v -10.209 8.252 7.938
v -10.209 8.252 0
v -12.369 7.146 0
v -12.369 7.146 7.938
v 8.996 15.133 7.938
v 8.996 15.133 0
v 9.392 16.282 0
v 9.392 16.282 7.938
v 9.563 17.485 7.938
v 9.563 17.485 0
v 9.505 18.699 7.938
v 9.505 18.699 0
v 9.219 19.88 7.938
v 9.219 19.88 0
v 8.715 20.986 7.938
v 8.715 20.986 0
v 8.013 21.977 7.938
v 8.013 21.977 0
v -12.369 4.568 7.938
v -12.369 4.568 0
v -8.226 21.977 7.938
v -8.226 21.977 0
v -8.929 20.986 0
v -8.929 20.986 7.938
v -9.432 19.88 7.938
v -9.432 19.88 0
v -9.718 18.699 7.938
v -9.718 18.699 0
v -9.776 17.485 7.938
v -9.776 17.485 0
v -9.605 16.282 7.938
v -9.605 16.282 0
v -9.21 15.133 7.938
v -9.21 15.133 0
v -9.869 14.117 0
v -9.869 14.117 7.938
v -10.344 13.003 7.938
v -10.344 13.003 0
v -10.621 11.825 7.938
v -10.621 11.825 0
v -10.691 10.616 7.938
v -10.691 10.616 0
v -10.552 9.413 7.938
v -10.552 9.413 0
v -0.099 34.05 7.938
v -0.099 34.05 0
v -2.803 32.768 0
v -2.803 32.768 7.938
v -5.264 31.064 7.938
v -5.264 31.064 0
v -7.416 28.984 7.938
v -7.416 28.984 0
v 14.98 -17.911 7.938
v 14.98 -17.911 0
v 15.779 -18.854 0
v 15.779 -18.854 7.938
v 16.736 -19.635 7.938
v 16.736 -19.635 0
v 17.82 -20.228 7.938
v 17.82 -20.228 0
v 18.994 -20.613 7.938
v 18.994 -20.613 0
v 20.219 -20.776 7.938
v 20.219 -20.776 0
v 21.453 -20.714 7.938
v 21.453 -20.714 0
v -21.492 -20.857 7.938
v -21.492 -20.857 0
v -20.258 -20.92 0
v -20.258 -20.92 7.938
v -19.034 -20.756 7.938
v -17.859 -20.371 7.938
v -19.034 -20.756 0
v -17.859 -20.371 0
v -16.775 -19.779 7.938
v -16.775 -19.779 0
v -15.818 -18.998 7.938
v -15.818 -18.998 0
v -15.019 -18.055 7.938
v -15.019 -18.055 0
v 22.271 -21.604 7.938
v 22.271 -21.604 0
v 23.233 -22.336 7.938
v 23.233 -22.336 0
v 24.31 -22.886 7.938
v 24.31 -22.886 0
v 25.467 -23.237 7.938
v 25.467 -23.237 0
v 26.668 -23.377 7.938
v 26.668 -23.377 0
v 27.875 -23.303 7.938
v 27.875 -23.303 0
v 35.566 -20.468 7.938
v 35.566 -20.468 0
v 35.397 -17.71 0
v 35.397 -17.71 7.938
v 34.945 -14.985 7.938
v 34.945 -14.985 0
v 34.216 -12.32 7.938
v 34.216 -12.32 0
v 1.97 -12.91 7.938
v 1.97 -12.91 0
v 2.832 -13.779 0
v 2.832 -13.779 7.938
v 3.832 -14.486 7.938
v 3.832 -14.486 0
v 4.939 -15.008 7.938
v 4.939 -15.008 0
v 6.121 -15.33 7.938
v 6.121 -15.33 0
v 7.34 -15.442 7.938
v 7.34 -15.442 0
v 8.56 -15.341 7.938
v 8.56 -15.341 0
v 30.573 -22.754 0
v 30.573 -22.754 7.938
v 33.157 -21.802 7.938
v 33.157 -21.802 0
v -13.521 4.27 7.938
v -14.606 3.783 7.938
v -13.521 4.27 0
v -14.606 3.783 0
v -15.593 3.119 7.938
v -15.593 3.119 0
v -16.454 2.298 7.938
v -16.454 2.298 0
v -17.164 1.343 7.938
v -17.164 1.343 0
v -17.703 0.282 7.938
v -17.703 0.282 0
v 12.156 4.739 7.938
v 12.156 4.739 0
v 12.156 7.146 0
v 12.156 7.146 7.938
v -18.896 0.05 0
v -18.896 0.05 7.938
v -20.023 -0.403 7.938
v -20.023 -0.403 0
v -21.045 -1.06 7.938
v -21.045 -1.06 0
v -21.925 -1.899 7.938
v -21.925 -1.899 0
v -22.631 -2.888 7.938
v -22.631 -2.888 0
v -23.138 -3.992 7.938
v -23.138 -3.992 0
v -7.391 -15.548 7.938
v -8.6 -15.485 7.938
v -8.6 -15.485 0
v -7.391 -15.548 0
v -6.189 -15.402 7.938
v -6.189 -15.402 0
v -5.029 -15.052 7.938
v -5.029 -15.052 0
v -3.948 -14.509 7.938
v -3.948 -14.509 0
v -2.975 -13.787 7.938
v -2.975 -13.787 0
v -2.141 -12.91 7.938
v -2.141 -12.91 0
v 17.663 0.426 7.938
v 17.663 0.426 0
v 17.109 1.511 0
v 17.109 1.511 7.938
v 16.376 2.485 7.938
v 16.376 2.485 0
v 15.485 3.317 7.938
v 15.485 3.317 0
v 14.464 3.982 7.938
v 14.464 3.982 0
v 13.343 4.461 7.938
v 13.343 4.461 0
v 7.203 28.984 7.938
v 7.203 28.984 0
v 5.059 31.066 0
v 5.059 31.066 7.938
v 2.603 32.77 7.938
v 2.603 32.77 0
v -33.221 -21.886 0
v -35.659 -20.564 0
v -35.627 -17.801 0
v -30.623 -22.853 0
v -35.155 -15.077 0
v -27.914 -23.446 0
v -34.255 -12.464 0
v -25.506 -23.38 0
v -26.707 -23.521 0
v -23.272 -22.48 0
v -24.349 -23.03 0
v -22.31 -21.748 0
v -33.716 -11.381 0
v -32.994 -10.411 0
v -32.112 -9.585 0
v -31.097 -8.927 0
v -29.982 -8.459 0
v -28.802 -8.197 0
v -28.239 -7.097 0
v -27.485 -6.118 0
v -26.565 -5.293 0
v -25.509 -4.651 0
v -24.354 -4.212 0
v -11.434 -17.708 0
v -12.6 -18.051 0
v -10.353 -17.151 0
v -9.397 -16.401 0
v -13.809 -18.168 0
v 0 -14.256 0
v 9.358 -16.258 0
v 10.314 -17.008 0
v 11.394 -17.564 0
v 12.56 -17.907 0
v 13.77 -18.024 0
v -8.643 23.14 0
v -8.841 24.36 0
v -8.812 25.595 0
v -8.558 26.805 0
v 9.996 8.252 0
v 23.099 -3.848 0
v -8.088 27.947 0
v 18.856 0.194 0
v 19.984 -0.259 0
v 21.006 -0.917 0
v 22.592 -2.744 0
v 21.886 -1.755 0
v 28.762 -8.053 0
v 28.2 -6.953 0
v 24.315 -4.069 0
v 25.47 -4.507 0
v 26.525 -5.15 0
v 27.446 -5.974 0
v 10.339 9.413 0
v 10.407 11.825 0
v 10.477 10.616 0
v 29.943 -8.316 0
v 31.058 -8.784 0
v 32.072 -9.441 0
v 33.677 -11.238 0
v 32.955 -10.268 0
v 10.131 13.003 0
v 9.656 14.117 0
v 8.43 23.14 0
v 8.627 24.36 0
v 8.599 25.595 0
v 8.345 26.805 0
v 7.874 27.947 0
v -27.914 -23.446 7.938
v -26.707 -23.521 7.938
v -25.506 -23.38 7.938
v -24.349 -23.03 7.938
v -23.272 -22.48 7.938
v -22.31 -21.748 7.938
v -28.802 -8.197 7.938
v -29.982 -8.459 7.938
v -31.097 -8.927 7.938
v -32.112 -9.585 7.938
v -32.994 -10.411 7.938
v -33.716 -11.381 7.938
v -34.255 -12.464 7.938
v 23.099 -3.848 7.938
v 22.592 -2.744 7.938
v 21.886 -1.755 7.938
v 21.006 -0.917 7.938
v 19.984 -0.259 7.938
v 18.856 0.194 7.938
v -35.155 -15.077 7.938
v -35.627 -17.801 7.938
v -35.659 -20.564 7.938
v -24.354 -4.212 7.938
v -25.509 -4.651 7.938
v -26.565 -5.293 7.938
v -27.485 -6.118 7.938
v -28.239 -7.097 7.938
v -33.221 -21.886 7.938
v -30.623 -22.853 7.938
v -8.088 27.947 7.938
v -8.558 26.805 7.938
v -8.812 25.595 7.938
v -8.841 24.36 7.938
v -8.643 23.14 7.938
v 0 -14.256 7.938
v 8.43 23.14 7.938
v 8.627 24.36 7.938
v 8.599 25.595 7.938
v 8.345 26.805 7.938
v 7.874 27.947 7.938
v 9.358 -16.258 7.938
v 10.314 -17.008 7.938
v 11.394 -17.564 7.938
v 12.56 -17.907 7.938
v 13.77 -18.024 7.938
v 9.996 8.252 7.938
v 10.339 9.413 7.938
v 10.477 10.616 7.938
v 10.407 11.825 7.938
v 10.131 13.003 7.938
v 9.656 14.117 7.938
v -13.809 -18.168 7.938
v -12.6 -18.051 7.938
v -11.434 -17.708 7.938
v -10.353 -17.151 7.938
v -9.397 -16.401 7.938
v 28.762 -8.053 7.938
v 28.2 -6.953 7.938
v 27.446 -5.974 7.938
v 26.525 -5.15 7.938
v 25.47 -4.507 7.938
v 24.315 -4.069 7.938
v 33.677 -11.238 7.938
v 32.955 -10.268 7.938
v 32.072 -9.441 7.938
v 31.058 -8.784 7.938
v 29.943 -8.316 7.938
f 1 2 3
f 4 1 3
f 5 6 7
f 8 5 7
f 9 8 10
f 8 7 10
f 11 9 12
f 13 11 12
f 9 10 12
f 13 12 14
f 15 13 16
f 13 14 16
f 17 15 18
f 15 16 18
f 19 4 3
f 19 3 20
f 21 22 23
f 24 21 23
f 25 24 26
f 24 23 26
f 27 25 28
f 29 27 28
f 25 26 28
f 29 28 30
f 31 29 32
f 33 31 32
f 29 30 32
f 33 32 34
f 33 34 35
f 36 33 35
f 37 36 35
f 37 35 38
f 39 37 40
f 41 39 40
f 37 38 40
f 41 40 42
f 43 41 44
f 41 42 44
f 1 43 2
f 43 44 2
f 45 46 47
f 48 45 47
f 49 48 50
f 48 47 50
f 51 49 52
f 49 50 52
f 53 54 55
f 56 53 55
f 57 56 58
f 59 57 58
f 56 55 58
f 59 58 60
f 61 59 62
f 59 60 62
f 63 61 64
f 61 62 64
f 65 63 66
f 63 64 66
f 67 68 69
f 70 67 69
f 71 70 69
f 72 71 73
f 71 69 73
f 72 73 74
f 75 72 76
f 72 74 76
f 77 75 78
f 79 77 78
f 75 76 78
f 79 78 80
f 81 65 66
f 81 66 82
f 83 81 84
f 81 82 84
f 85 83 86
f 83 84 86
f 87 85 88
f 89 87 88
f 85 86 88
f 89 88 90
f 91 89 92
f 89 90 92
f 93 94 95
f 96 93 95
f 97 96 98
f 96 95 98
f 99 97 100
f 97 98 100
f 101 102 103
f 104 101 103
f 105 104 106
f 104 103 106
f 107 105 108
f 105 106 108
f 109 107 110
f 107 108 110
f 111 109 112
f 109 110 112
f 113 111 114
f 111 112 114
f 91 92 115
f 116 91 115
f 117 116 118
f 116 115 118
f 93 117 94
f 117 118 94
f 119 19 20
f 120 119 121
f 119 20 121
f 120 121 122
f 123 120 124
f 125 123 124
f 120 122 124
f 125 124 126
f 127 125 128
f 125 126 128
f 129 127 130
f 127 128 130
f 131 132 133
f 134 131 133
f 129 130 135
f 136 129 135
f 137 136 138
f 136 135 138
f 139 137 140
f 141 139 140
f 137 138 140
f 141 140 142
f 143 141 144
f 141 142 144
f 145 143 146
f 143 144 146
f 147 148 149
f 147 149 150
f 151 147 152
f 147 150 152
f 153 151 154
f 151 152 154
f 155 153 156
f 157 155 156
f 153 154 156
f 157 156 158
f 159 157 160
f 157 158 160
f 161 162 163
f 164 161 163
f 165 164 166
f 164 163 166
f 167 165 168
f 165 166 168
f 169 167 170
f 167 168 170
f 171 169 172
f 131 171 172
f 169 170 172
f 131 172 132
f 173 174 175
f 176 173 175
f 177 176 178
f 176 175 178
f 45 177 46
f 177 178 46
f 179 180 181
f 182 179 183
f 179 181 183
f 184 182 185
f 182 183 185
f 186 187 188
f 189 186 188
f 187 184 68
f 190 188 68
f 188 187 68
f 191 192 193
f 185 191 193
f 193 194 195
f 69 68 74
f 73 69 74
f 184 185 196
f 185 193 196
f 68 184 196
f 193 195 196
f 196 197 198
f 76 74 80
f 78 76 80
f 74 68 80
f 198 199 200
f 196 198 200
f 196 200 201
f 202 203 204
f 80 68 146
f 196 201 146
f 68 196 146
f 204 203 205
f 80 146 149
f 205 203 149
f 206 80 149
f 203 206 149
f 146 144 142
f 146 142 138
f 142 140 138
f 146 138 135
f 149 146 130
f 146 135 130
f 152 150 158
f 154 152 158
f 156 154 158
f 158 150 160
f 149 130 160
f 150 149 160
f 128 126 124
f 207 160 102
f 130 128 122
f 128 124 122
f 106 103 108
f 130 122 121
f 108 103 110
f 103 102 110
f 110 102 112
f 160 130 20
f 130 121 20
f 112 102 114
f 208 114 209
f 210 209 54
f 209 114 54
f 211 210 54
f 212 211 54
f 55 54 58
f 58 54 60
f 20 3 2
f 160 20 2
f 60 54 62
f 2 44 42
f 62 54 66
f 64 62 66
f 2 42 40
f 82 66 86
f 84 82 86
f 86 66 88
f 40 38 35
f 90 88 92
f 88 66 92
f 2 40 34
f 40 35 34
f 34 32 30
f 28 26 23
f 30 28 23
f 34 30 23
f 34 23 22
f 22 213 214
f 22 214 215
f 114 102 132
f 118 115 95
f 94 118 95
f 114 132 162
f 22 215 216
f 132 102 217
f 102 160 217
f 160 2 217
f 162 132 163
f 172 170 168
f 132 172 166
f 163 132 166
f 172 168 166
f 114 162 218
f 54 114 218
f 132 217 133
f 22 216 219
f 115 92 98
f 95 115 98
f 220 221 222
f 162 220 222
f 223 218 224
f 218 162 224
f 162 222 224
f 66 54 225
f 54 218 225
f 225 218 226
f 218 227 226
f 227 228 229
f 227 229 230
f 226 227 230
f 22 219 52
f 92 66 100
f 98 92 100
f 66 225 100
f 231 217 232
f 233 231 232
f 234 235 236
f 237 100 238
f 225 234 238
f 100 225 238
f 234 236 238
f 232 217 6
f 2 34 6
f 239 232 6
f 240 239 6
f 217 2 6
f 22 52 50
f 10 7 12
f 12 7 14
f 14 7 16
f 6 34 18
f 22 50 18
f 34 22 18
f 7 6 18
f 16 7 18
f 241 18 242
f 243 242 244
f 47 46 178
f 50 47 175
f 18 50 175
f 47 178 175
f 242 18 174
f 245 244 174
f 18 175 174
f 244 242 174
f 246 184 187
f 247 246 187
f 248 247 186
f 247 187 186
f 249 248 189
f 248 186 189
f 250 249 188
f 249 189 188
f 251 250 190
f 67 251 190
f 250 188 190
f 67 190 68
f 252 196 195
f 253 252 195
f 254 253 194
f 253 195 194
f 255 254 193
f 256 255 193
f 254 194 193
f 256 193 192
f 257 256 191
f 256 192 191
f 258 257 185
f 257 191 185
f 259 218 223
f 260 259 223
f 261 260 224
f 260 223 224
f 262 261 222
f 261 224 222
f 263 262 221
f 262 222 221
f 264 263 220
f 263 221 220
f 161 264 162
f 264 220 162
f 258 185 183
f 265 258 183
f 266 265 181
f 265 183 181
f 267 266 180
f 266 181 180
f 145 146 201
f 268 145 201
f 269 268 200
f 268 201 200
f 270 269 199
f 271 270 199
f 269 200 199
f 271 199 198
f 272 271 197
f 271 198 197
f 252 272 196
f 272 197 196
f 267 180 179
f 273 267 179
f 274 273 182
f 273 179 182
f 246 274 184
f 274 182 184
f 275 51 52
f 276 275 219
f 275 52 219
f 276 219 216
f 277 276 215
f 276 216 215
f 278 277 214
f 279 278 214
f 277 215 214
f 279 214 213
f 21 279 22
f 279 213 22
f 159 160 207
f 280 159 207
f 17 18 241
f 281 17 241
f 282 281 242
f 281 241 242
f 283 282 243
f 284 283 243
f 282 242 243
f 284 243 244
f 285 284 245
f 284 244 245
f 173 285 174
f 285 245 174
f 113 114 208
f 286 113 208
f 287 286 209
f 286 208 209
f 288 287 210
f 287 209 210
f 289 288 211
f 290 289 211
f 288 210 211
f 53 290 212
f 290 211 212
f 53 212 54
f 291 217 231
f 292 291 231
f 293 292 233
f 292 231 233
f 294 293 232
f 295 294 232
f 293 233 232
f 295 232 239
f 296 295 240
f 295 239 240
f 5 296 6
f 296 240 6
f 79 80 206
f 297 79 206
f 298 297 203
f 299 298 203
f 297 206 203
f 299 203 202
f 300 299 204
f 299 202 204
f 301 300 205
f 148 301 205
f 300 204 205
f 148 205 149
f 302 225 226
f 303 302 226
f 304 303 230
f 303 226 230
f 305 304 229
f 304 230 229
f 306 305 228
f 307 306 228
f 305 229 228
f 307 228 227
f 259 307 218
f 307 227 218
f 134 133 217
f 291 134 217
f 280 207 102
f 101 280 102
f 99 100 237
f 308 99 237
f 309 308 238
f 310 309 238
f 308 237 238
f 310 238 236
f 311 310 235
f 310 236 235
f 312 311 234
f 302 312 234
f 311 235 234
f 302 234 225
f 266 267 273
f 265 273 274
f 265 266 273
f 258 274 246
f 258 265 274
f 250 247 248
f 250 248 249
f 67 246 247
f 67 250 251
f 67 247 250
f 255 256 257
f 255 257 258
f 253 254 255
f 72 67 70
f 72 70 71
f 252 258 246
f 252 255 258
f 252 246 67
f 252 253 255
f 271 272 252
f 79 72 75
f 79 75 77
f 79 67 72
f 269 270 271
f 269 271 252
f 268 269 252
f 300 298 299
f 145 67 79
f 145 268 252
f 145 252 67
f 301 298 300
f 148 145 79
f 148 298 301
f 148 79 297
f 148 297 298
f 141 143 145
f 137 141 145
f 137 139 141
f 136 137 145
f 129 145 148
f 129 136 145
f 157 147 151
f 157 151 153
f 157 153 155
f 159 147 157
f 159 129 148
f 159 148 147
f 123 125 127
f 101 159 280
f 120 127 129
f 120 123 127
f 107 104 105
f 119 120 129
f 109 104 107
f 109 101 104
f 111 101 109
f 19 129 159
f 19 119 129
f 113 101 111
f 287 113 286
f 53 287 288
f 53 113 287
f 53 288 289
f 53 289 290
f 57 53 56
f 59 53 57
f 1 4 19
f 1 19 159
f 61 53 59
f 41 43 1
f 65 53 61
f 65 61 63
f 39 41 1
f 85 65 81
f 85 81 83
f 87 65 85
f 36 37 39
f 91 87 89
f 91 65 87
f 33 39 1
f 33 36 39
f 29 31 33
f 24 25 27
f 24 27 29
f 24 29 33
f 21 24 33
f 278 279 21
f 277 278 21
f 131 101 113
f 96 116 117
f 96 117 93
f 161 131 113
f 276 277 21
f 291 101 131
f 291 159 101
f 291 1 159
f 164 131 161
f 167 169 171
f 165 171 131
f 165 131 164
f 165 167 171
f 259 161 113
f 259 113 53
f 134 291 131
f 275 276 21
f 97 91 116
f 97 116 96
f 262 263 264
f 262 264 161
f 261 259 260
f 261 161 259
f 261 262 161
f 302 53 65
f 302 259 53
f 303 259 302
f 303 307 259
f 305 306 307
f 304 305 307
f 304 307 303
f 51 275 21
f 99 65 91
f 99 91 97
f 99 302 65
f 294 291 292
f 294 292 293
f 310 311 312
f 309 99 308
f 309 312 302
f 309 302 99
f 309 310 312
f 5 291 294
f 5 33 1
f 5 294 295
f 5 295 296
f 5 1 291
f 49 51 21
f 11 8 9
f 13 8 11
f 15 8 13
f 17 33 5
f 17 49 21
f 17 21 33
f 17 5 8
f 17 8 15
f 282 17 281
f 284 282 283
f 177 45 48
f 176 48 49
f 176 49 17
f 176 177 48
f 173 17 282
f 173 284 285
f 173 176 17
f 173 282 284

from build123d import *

# Parameters (mm, degrees)
F1_DEPTH = 7.9375


# Not quite as in the source:
# - a length typed as a fraction of an inch, garbled in the dataset ("3 / 203.2 mm" for 3/8 in), is restored


with BuildPart() as f1:
    # F0 (on Top) → F1 (new body)
    with BuildSketch(Plane.XY):
        with BuildLine():
            ThreePointArc((-0.0986067535, 34.0497419238), (-4.0682176485, 31.9659465467), (-7.4162920937, 28.9842672646))
            ThreePointArc((-7.4162920937, 28.9842672646), (-8.8119305122, 25.5953281623), (-8.2258973271, 21.977417171))
            ThreePointArc((-8.2258973271, 21.977417171), (-9.7181261566, 18.698842434), (-9.2097157612, 15.1327075437))
            ThreePointArc((-9.2097157612, 15.1327075437), (-10.6205392688, 11.8246856933), (-10.2093555033, 8.2519613206))
            Line((-10.2093555033, 8.2519613206), (-12.369341217, 7.1464567445))
            Line((-12.369341217, 7.1464567445), (-12.369341217, 4.6386048198))
            Line((-12.369341217, 4.6386048198), (-12.369341217, 4.5682978211))
            ThreePointArc((-12.369341217, 4.5682978211), (-15.5930977879, 3.1185654947), (-17.7027139134, 0.2823972963))
            ThreePointArc((-17.7027139134, 0.2823972963), (-21.0452825194, -1.0603738309), (-23.1384971151, -3.9919692741))
            ThreePointArc((-23.1384971151, -3.9919692741), (-26.5647165348, -5.2934051439), (-28.80180468, -8.19653302))
            ThreePointArc((-28.80180468, -8.19653302), (-32.1117440701, -9.5846599904), (-34.254974256, -12.4637500588))
            ThreePointArc((-34.254974256, -12.4637500588), (-35.4454588739, -16.4293701566), (-35.6585793197, -20.564340055))
            ThreePointArc((-35.6585793197, -20.564340055), (-31.9389059128, -22.4150036937), (-27.9142765499, -23.4461606411))
            ThreePointArc((-27.9142765499, -23.4461606411), (-24.3492963179, -23.0296138883), (-21.4921734029, -20.8571857766))
            ThreePointArc((-21.4921734029, -20.8571857766), (-17.8594468391, -20.3713745504), (-15.0192606046, -18.054899429))
            ThreePointArc((-15.0192606046, -18.054899429), (-11.4338171794, -17.7079201351), (-8.5996589687, -15.484556372))
            ThreePointArc((-8.5996589687, -15.484556372), (-5.0294162563, -15.0523544446), (-2.1409380715, -12.9098966718))
            Line((-2.1409380715, -12.9098966718), (0, -14.2561570176))
            Line((0, -14.2561570176), (1.9696742658, -12.9098966718))
            ThreePointArc((1.9696742658, -12.9098966718), (4.9392756736, -15.0084468105), (8.560301624, -15.3410370587))
            ThreePointArc((8.560301624, -15.3410370587), (11.3944598347, -17.5644008218), (14.9799032599, -17.9113801157))
            ThreePointArc((14.9799032599, -17.9113801157), (17.8200894944, -20.2278552371), (21.4528160582, -20.7136664634))
            ThreePointArc((21.4528160582, -20.7136664634), (24.3099389732, -22.886094575), (27.8749192052, -23.3026413279))
            ThreePointArc((27.8749192052, -23.3026413279), (31.8832272801, -22.3269581873), (35.5659238994, -20.4678624868))
            ThreePointArc((35.5659238994, -20.4678624868), (35.2059818343, -16.3418066269), (34.2156169113, -12.3202307456))
            ThreePointArc((34.2156169113, -12.3202307456), (32.0723867254, -9.4411406771), (28.7624473353, -8.0530137067))
            ThreePointArc((28.7624473353, -8.0530137067), (26.5253591901, -5.1498858306), (23.0991397704, -3.8484499608))
            ThreePointArc((23.0991397704, -3.8484499608), (21.0059251747, -0.9168545176), (17.6633565687, 0.4259166096))
            ThreePointArc((17.6633565687, 0.4259166096), (15.4847616458, 3.3168082822), (12.1560195839, 4.739132713))
            Line((12.1560195839, 4.739132713), (12.1560195839, 7.1464567445))
            Line((12.1560195839, 7.1464567445), (9.9960338703, 8.2519613206))
            ThreePointArc((9.9960338703, 8.2519613206), (10.4072176357, 11.8246856933), (8.9963941282, 15.1327075437))
            ThreePointArc((8.9963941282, 15.1327075437), (9.5048045235, 18.698842434), (8.012575694, 21.977417171))
            ThreePointArc((8.012575694, 21.977417171), (8.5986088792, 25.5953281623), (7.2029704606, 28.9842672646))
            ThreePointArc((7.2029704606, 28.9842672646), (3.8655773676, 31.9687453881), (-0.0986067535, 34.0497419238))
        make_face()
    extrude(amount=F1_DEPTH)


solid = f1.part
